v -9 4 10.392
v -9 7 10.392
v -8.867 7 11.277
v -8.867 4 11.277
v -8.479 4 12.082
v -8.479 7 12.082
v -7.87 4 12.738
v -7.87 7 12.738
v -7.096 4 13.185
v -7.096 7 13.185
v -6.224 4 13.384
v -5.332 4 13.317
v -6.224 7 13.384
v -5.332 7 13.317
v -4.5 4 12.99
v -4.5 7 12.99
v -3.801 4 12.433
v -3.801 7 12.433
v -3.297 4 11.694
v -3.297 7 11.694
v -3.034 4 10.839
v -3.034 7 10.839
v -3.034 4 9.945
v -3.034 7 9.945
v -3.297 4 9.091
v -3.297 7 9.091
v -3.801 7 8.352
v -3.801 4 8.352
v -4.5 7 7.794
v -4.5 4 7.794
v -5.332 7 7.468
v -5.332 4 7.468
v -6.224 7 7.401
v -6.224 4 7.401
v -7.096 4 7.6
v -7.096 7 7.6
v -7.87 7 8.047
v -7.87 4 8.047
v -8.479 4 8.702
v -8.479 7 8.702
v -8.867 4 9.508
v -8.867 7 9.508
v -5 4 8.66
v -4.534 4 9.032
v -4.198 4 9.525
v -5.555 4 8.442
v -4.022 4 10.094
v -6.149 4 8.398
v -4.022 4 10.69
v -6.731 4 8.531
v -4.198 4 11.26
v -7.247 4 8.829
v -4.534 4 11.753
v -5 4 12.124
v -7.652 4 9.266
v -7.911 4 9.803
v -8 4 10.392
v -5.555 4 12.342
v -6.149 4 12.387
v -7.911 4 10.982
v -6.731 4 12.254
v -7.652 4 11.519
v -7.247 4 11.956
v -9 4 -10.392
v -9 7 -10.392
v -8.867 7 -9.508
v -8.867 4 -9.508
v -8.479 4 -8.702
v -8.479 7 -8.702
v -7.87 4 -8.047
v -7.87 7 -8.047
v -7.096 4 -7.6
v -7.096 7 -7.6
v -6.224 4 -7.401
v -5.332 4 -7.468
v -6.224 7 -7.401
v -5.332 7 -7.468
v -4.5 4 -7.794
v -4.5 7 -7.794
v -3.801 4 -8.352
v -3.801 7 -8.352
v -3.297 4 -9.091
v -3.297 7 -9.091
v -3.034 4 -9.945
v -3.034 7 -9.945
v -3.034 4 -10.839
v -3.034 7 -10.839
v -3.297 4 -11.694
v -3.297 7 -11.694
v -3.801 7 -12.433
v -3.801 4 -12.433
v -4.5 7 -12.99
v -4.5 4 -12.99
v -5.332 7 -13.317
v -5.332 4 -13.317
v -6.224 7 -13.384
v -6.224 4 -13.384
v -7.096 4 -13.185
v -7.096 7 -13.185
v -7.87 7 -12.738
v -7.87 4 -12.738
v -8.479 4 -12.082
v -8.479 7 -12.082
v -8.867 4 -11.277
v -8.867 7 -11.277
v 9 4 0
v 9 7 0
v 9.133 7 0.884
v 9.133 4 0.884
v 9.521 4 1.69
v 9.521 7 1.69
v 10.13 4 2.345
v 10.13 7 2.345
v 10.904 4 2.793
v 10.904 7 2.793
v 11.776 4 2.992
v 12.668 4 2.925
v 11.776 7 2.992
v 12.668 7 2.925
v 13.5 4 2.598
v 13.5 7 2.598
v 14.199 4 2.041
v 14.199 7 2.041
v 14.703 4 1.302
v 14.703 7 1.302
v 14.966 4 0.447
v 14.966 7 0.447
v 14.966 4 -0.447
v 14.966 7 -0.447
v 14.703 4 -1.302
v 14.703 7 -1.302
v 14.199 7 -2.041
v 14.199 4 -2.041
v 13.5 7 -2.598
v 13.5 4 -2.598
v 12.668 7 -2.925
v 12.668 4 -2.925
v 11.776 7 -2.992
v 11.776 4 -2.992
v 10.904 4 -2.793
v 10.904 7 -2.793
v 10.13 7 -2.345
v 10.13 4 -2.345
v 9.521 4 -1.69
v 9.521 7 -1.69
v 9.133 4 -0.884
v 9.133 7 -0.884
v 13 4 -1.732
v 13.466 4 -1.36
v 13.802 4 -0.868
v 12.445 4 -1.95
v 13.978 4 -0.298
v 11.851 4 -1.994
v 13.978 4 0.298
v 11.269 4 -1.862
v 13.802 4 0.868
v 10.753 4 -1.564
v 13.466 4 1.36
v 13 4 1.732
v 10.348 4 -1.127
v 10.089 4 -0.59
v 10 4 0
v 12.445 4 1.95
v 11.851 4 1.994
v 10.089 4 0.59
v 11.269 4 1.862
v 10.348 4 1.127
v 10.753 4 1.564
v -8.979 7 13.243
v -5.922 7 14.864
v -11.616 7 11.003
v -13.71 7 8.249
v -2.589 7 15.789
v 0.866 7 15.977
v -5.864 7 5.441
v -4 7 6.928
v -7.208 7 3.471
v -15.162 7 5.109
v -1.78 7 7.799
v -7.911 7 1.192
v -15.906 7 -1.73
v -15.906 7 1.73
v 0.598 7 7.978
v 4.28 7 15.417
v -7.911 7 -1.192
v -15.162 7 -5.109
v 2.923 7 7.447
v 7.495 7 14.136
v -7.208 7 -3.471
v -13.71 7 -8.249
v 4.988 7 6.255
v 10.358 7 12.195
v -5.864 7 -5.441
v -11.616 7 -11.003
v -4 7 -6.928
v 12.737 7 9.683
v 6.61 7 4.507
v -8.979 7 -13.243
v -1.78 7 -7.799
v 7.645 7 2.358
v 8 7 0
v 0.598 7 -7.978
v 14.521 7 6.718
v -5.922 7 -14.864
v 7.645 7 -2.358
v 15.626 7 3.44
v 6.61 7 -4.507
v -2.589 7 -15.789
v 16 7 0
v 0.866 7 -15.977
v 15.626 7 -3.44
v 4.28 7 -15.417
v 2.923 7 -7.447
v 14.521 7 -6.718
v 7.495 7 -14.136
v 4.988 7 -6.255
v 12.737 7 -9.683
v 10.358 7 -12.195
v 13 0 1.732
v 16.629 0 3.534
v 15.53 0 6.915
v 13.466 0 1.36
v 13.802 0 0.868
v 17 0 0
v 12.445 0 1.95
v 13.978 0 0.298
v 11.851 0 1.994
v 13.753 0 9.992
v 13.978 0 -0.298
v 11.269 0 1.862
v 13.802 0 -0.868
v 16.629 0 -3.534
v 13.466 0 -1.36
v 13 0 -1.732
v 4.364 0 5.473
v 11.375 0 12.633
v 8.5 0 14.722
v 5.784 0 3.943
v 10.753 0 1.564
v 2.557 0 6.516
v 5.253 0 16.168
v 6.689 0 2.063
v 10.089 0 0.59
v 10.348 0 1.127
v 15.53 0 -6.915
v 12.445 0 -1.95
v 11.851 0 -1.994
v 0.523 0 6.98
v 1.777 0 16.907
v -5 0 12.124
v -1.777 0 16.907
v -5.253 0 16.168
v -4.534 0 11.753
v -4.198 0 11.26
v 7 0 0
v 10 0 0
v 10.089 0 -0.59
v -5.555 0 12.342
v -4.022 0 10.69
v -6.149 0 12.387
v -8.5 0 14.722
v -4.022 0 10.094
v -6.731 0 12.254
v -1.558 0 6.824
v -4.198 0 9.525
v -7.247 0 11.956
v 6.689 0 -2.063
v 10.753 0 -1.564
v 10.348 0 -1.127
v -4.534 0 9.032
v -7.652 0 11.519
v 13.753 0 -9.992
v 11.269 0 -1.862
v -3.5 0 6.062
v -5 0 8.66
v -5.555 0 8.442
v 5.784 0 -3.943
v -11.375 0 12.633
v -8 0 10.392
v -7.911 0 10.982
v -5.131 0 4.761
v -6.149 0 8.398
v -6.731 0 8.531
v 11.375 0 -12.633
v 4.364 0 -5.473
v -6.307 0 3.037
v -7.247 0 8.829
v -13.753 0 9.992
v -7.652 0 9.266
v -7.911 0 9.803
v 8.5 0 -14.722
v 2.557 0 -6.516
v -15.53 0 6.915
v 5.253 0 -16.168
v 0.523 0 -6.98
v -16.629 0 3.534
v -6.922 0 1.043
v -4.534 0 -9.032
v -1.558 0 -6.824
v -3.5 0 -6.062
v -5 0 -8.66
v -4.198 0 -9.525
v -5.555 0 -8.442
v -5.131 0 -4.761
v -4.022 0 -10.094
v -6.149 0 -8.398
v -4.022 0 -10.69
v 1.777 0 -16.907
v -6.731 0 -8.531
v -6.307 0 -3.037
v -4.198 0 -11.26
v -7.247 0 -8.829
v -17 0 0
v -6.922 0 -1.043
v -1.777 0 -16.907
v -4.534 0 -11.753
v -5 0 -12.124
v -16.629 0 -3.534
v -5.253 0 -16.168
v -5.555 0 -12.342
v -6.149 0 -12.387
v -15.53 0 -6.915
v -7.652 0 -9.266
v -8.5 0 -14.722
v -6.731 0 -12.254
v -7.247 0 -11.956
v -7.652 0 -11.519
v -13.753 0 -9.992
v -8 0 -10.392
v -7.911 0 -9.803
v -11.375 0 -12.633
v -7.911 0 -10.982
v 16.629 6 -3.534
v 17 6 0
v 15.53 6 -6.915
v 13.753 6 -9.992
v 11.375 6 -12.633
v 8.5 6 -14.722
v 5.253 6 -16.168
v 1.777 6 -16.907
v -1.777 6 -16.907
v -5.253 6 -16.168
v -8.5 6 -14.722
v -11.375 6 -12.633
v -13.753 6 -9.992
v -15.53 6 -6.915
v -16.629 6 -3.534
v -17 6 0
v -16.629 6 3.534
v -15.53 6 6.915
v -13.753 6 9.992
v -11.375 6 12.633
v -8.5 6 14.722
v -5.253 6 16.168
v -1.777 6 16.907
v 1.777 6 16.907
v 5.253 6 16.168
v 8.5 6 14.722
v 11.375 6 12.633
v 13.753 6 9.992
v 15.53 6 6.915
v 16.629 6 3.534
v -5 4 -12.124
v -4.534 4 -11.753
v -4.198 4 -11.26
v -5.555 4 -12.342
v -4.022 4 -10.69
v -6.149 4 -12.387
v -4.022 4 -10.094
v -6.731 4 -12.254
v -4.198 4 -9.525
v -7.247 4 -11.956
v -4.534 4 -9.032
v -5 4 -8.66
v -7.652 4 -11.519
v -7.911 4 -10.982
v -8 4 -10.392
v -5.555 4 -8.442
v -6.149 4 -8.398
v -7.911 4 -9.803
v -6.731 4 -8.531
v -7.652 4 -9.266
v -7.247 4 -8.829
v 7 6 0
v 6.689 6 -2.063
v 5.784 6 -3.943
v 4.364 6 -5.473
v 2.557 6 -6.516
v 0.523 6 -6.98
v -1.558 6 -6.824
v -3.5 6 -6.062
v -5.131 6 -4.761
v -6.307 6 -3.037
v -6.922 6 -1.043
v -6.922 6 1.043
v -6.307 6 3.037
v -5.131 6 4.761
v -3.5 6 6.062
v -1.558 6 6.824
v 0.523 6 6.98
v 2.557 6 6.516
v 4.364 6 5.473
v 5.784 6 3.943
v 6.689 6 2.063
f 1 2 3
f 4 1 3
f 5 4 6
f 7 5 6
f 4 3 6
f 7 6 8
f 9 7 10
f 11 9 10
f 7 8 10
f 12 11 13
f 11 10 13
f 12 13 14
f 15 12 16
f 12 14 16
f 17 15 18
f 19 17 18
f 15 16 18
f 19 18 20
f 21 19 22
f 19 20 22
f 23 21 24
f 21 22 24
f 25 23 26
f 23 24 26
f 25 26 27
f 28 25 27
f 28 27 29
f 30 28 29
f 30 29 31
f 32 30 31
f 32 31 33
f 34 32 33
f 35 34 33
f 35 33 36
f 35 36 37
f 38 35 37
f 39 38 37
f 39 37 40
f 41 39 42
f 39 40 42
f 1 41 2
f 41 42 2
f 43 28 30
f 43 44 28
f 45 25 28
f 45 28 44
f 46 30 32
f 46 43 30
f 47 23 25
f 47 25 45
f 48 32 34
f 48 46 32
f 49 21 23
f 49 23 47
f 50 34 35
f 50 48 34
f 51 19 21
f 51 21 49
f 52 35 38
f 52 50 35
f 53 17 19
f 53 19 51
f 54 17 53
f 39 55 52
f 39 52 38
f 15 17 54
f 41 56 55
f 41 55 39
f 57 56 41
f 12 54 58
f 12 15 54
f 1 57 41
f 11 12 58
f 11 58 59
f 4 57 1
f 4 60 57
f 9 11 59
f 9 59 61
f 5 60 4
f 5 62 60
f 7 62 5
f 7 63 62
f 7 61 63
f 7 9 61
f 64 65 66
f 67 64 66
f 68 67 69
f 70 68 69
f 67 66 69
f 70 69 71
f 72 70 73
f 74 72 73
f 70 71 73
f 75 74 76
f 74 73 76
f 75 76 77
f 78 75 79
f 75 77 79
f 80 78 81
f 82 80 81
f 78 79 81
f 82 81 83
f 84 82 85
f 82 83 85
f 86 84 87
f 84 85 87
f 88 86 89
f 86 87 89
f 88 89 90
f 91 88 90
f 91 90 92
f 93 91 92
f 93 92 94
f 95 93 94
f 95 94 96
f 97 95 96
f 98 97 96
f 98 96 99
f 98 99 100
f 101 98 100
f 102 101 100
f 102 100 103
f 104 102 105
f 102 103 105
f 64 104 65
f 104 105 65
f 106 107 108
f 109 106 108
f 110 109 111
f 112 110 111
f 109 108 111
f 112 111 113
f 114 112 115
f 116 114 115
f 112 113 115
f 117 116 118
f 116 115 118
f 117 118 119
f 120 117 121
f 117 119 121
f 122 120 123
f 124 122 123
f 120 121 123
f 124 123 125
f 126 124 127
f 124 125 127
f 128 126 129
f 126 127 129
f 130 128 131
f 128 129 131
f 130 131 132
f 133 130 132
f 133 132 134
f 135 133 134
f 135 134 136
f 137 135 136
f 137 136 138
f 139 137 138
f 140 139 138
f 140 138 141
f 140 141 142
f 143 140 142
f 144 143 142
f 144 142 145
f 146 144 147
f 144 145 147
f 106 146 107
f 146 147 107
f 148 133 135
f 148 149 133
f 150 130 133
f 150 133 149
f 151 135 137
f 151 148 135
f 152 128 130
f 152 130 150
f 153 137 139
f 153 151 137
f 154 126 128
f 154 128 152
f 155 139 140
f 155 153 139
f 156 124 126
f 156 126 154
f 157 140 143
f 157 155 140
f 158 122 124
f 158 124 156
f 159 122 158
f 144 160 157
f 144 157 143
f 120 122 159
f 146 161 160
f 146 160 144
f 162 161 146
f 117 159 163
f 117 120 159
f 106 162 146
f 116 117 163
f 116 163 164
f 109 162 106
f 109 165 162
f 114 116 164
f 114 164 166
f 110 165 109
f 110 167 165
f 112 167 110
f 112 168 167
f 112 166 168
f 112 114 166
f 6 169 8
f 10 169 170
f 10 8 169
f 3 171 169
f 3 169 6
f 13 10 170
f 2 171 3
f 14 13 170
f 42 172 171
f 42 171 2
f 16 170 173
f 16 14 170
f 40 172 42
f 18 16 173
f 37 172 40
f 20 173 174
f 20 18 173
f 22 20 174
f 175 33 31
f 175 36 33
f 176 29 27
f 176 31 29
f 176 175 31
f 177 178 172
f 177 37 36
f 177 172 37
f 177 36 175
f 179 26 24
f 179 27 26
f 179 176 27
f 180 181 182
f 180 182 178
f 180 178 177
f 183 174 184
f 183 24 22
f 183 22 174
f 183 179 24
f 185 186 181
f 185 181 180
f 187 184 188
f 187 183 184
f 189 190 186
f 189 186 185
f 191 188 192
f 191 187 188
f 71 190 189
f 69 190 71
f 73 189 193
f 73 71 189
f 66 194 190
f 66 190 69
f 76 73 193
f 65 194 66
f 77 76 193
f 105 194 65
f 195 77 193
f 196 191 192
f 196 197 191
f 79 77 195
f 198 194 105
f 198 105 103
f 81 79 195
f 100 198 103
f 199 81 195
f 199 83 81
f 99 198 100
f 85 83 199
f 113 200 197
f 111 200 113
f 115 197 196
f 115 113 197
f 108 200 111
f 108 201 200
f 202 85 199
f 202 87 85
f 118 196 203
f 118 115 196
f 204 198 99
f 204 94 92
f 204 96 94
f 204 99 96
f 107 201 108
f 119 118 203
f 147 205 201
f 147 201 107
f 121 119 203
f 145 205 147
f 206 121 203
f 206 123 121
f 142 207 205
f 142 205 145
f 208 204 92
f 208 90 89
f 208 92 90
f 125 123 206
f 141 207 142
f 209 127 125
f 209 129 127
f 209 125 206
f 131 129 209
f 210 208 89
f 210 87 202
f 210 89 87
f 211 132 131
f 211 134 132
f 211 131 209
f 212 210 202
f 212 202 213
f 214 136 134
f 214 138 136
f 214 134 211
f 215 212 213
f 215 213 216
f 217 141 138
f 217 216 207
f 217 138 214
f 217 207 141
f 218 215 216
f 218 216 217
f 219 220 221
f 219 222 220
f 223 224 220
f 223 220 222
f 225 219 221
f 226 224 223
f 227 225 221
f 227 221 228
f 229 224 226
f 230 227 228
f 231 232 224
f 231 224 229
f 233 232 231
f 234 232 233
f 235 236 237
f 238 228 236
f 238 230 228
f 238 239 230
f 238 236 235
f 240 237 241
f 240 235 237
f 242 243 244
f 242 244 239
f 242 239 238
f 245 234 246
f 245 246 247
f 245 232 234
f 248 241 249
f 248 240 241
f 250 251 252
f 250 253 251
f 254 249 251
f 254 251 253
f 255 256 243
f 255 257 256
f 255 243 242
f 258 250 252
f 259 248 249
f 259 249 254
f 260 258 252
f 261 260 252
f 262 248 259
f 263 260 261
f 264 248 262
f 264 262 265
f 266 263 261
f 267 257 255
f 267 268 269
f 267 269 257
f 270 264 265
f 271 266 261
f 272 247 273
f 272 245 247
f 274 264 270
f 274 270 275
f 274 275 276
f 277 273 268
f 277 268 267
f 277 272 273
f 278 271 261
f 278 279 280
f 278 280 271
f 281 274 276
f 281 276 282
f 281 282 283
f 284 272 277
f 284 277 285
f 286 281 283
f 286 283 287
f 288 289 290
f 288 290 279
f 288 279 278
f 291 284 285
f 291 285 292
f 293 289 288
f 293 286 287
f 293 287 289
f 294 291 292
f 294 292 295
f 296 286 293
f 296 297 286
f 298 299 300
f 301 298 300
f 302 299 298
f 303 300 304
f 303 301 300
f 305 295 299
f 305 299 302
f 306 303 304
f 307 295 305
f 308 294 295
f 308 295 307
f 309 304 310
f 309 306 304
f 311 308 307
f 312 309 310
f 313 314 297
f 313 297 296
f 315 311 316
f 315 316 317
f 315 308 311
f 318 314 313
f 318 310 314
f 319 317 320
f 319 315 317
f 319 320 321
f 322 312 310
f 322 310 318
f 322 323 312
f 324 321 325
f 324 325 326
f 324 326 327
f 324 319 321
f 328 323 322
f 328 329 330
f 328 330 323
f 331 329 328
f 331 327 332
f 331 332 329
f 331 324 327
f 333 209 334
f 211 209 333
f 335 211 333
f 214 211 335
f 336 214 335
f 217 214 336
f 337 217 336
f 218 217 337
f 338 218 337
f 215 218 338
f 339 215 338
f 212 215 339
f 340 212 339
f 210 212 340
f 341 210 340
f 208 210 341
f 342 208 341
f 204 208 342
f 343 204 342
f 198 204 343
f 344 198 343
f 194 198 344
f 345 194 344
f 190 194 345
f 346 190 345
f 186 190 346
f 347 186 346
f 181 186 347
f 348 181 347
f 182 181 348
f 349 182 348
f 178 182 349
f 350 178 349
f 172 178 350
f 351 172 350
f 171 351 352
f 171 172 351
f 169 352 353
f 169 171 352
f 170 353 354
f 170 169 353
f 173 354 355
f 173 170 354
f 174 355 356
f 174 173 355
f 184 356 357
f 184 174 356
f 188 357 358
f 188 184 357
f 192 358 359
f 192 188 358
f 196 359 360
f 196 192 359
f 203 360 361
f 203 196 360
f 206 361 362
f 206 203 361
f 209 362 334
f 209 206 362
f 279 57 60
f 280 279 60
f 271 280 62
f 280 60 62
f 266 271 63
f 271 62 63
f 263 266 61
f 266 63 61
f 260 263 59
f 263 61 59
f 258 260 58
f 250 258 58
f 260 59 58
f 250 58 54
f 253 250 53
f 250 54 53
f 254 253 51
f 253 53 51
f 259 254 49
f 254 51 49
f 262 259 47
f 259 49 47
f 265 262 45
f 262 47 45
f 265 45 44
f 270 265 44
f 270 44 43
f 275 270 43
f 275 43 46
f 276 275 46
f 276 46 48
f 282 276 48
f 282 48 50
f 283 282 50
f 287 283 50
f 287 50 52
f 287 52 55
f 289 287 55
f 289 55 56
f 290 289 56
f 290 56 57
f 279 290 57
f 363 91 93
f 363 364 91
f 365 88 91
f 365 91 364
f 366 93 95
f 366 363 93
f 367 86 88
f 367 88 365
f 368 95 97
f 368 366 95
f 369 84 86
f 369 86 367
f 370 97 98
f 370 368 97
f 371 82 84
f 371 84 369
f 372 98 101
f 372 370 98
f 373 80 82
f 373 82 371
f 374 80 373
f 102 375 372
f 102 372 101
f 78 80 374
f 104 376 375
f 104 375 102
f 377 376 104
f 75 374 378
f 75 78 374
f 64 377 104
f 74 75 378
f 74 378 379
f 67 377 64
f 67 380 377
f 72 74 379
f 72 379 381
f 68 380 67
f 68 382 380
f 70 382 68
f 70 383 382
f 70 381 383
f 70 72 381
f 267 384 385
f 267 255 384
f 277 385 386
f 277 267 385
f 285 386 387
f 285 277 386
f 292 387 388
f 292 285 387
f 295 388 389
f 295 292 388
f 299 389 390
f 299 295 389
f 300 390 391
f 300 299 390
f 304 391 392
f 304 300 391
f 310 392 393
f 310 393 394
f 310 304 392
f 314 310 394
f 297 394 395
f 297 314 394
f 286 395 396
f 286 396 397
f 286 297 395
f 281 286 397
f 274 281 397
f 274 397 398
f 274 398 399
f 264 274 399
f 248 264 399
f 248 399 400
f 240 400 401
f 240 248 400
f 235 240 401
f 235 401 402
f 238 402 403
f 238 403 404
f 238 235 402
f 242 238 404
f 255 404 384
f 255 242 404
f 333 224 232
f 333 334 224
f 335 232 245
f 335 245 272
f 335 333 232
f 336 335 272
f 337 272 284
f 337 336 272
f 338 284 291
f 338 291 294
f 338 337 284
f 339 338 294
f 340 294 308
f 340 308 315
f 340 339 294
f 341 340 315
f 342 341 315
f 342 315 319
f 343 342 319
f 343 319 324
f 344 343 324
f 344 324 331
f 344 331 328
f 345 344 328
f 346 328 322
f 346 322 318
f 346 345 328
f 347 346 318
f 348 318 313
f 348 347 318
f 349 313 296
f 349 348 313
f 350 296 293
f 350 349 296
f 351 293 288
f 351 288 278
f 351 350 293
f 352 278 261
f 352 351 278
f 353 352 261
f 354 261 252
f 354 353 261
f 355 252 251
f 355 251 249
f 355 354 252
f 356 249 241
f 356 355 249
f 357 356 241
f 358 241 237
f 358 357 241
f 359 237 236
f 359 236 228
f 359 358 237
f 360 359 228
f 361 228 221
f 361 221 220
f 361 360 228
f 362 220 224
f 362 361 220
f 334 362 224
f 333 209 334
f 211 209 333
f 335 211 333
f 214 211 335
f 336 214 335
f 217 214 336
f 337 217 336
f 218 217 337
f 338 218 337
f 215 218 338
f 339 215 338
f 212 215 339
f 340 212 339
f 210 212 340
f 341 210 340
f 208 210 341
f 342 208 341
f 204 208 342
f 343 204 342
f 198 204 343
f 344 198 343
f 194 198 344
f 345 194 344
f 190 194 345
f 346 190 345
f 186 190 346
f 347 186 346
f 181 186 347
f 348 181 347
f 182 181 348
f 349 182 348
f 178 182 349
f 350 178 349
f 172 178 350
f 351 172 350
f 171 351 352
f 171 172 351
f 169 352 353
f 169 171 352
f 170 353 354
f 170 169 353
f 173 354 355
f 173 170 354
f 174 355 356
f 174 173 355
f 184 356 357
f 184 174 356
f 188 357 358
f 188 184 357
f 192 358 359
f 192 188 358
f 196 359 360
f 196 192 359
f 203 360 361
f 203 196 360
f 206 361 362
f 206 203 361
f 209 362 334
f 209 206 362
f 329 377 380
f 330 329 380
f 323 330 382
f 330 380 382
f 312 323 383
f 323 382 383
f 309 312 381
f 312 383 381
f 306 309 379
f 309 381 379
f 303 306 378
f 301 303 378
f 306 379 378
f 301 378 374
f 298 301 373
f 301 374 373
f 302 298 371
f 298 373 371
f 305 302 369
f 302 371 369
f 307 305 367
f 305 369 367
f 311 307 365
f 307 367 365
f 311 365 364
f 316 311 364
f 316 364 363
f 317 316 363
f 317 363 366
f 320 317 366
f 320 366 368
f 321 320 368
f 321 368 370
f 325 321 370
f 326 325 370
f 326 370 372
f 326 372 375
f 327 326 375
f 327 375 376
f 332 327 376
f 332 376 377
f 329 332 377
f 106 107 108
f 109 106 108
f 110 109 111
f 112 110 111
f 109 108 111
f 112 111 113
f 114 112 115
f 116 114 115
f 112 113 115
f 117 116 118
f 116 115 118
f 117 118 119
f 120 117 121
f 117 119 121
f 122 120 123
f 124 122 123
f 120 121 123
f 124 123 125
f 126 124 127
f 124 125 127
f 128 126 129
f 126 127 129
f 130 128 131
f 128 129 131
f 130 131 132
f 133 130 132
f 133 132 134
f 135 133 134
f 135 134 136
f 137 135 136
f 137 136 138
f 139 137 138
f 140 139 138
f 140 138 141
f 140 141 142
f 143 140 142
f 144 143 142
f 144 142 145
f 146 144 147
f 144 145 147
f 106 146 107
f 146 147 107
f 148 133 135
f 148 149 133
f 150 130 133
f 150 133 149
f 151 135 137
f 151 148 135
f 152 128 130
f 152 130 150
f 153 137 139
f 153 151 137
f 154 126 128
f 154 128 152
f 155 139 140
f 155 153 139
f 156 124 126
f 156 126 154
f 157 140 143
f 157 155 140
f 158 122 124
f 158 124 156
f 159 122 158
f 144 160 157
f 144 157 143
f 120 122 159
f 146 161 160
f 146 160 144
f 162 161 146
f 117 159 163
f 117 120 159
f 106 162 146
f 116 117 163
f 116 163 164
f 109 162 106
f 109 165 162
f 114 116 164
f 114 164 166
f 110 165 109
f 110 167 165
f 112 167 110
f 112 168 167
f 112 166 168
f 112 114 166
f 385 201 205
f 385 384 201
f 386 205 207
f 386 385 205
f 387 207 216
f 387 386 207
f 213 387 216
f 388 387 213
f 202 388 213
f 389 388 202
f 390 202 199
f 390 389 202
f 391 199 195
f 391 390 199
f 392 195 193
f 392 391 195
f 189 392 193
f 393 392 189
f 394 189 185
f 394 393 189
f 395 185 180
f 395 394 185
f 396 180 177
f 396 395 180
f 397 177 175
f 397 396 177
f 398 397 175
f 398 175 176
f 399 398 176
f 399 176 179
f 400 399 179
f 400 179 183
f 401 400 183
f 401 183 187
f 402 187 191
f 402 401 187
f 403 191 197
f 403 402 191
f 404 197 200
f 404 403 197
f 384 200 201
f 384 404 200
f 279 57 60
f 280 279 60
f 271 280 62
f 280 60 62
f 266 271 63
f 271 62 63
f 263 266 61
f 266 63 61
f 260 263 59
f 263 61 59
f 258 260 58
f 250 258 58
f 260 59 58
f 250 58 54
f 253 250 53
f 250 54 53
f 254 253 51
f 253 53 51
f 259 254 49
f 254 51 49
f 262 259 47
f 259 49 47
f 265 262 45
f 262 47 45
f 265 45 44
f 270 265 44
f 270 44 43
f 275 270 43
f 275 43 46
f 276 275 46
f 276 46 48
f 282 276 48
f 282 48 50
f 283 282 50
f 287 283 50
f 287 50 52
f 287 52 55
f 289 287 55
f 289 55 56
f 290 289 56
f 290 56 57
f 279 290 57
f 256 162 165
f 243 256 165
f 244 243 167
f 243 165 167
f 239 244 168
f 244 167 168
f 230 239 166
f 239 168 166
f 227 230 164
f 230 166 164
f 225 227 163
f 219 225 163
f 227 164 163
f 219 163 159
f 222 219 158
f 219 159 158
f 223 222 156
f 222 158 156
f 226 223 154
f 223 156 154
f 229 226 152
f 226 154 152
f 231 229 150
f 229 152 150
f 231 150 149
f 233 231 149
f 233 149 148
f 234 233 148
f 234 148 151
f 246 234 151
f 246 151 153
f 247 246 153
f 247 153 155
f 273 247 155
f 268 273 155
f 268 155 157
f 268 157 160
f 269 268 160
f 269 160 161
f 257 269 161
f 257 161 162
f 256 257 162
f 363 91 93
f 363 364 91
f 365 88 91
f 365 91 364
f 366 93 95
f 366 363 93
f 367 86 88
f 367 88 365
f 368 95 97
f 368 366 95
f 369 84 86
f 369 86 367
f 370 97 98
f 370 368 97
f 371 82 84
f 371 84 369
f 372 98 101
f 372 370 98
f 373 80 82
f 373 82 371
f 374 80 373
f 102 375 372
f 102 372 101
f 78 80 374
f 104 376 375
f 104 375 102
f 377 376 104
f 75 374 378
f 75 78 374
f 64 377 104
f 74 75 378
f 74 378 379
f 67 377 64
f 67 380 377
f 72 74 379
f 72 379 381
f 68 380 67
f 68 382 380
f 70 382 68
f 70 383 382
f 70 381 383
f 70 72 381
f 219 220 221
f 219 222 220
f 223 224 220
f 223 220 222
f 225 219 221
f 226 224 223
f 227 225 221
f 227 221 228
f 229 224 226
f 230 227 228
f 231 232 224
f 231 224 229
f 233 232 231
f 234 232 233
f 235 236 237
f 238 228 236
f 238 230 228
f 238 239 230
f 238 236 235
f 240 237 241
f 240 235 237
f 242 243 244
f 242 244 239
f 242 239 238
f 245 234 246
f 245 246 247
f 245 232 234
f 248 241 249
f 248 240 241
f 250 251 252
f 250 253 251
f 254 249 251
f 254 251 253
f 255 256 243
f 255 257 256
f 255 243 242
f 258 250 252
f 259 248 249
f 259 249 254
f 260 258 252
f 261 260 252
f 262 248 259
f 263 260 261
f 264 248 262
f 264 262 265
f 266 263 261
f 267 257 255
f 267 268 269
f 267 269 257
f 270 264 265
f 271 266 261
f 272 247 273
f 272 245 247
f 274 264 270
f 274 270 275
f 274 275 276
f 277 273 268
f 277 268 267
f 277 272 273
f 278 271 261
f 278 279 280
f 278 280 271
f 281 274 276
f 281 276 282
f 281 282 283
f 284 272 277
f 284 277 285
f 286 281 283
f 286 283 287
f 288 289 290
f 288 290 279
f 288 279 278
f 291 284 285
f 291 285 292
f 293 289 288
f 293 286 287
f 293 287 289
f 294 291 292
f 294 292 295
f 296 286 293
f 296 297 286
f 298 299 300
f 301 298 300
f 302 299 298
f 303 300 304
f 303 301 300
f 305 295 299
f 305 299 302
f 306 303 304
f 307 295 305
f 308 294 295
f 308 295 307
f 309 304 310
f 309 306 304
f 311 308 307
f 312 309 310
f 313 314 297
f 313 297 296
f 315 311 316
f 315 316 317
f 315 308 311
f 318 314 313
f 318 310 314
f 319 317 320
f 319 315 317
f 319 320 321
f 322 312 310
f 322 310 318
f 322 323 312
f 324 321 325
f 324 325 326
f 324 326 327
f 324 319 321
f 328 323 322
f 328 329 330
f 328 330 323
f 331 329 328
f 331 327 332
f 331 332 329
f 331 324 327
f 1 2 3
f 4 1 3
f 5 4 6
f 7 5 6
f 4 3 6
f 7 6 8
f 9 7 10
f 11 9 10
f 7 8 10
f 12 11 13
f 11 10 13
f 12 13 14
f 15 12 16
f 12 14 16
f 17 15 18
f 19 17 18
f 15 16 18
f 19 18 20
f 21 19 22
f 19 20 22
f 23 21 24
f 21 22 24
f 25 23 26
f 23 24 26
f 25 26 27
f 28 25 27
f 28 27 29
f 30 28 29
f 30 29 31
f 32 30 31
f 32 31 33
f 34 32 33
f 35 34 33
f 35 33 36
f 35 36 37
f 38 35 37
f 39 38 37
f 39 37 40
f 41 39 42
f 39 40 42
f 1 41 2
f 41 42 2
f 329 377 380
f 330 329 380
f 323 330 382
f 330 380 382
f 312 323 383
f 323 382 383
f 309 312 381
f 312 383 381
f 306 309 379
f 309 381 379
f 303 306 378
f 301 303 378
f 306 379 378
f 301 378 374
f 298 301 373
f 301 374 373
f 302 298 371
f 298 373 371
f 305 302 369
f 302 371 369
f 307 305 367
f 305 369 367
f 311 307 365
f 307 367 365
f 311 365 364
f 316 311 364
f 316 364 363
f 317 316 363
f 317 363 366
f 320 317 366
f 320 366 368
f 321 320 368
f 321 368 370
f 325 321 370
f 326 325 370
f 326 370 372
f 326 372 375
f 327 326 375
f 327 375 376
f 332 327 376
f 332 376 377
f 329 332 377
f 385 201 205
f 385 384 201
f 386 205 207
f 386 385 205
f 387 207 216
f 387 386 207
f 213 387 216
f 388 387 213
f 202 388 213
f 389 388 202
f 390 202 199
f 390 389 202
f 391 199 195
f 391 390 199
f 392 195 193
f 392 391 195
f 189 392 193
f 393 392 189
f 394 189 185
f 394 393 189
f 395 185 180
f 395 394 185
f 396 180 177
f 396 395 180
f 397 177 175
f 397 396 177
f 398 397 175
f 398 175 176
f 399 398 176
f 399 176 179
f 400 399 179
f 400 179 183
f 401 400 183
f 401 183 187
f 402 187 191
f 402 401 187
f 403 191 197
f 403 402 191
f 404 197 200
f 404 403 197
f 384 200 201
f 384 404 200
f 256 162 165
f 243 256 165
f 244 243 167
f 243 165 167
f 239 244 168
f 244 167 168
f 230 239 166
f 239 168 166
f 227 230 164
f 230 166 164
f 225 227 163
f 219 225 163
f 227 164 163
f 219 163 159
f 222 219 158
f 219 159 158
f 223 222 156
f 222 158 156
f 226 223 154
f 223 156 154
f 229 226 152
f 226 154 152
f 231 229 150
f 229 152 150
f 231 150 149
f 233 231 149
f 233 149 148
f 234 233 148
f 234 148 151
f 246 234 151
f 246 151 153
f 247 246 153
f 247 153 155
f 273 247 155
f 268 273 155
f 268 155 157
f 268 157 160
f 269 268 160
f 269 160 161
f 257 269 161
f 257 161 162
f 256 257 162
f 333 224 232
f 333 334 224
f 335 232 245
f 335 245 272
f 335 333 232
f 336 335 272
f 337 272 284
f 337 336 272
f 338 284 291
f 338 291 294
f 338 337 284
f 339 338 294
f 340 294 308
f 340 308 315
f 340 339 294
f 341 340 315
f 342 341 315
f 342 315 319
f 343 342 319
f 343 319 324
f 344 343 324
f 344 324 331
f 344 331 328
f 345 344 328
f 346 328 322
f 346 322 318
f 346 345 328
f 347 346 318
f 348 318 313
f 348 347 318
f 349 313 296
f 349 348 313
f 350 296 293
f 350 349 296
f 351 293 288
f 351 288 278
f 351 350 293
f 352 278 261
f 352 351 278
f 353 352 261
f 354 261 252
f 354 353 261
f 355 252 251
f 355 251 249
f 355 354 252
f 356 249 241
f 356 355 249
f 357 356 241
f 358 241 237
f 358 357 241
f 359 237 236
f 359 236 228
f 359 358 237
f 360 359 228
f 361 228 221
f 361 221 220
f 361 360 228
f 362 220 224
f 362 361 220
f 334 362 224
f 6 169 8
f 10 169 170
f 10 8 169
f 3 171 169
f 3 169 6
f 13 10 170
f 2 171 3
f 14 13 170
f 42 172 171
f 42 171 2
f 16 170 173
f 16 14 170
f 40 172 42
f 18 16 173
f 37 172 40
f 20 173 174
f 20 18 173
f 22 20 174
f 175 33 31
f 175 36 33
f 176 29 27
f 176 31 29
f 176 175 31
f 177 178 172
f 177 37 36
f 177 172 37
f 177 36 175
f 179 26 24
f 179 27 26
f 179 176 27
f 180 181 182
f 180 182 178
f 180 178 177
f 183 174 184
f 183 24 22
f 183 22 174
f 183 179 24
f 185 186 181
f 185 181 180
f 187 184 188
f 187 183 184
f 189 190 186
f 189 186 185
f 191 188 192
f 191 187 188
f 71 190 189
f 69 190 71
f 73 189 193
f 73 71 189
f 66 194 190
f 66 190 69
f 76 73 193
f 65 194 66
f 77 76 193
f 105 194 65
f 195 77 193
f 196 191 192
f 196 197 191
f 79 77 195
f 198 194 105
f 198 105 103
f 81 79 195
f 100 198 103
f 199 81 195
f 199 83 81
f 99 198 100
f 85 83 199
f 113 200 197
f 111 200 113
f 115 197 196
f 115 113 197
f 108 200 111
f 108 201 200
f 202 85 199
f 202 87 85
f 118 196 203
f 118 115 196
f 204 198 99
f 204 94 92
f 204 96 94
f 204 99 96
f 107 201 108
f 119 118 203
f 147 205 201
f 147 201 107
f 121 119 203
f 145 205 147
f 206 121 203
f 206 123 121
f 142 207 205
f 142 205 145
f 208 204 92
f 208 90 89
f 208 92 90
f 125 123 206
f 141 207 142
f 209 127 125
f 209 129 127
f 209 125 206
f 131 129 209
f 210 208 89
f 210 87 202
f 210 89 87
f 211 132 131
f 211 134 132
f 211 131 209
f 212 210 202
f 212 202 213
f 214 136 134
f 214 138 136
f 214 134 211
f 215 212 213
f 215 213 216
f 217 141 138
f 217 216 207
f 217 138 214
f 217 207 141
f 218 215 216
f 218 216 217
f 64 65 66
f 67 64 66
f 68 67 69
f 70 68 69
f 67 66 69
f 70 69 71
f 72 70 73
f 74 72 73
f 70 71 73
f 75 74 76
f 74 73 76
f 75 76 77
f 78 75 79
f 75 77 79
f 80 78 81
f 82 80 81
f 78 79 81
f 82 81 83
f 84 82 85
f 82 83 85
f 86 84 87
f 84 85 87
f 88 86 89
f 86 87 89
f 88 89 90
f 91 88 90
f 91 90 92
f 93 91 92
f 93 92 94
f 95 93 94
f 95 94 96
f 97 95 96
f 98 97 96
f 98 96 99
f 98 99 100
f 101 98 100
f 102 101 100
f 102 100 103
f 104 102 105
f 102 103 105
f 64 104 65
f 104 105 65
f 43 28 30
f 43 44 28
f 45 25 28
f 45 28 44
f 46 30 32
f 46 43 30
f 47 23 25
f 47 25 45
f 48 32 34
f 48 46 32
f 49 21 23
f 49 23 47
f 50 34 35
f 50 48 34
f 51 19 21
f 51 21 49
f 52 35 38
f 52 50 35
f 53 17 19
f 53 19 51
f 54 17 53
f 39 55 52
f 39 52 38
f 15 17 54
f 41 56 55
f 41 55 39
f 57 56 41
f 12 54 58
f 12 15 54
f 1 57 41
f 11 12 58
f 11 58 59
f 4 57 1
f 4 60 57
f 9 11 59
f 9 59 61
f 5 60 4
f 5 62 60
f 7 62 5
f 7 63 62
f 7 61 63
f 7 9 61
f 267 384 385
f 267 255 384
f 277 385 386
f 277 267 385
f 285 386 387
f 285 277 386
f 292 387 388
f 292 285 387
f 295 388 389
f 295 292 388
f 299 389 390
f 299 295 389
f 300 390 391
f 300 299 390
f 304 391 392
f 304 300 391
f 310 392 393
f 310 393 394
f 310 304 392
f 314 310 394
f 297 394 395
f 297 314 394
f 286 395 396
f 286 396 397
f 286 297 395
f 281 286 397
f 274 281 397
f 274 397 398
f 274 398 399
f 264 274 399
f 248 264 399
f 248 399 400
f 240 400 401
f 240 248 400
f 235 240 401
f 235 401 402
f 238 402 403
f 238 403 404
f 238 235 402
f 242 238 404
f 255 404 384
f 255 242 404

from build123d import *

# Parameters (mm, degrees)
SKETCH_2_R          = 3
SKETCH_2_R_2        = 2
CUT_EXTRUDE_1_DEPTH = 3
SKETCH_3_R          = 2
CUT_EXTRUDE_2_DEPTH = 26.039968051


# Read off the part's stored shape, not the designer's step: 旋转1
with BuildPart() as part:
    # 旋转1 outline → 旋转1 (revolve)
    with BuildSketch(Plane.XY):
        Polygon((7, 6), (7, 0), (17, 0), (17, 6), (16, 7), (8, 7), align=None)
    revolve(axis=Axis((0, 0, 0), (0, 1, 0)))


with BuildPart() as body_2:
    # Revolve 1 2 outline → Revolve 1 2 (revolve)
    with BuildSketch(Plane.XY):
        Polygon((8, 7), (7, 6), (7, 0), (17, 0), (17, 6), (16, 7), align=None)
    revolve(axis=Axis((0, 0, 0), (0, 1, 0)))


with BuildPart() as cut_extrude_1_tool:
    # 草图2 → 切除-拉伸1 (new body)
    # profile 1 of 3: a face of its own
    with BuildSketch(Plane(origin=(0, 7, 0), x_dir=(1, 0, 0), z_dir=(0, 1, 0))):
        with Locations(Location((12, 0, 0), (0, 0, 180))):
            Circle(SKETCH_2_R)
        with Locations(Location((12, 0, 0), (0, 0, 180))):
            Circle(SKETCH_2_R_2, mode=Mode.SUBTRACT)
    # profile 2 of 3: a face of its own
    with BuildSketch(Plane(origin=(0, 7, 0), x_dir=(1, 0, 0), z_dir=(0, 1, 0))):
        with Locations(Location((-6, -10.392304845, 0), (0, 0, 180))):
            Circle(SKETCH_2_R)
        with Locations(Location((-6, -10.392304845, 0), (0, 0, 180))):
            Circle(SKETCH_2_R_2, mode=Mode.SUBTRACT)
    # profile 3 of 3: a face of its own
    with BuildSketch(Plane(origin=(0, 7, 0), x_dir=(1, 0, 0), z_dir=(0, 1, 0))):
        with Locations(Location((-6, 10.392304845, 0), (0, 0, 180))):
            Circle(SKETCH_2_R)
        with Locations(Location((-6, 10.392304845, 0), (0, 0, 180))):
            Circle(SKETCH_2_R_2, mode=Mode.SUBTRACT)
    extrude(amount=-CUT_EXTRUDE_1_DEPTH)


with BuildPart() as part_1:
    add(part.part)

    # 切除-拉伸1: cut by cut_extrude_1_tool
    add(cut_extrude_1_tool.part, mode=Mode.SUBTRACT)


with BuildPart() as body_2_1:
    add(body_2.part)

    # 切除-拉伸1: cut by cut_extrude_1_tool
    add(cut_extrude_1_tool.part, mode=Mode.SUBTRACT)


with BuildPart() as cut_extrude_2_tool:
    # 草图3 → 切除-拉伸2 (new, through all)
    with BuildSketch(Plane(origin=(0, 7, 0), x_dir=(1, 0, 0), z_dir=(0, 1, 0))):
        with Locations(Location((-6, 10.392304845, 0), (0, 0, 180))):
            Circle(SKETCH_3_R)
        with Locations(Location((12, 0, 0), (0, 0, 180))):
            Circle(SKETCH_3_R)
        with Locations(Location((-6, -10.392304845, 0), (0, 0, 180))):
            Circle(SKETCH_3_R)
    extrude(amount=-CUT_EXTRUDE_2_DEPTH)


with BuildPart() as part_2:
    add(part_1.part)

    # 切除-拉伸2: cut by cut_extrude_2_tool
    add(cut_extrude_2_tool.part, mode=Mode.SUBTRACT)


with BuildPart() as body_2_2:
    add(body_2_1.part)

    # 切除-拉伸2: cut by cut_extrude_2_tool
    add(cut_extrude_2_tool.part, mode=Mode.SUBTRACT)


solid = Compound([part_2.part, body_2_2.part])
